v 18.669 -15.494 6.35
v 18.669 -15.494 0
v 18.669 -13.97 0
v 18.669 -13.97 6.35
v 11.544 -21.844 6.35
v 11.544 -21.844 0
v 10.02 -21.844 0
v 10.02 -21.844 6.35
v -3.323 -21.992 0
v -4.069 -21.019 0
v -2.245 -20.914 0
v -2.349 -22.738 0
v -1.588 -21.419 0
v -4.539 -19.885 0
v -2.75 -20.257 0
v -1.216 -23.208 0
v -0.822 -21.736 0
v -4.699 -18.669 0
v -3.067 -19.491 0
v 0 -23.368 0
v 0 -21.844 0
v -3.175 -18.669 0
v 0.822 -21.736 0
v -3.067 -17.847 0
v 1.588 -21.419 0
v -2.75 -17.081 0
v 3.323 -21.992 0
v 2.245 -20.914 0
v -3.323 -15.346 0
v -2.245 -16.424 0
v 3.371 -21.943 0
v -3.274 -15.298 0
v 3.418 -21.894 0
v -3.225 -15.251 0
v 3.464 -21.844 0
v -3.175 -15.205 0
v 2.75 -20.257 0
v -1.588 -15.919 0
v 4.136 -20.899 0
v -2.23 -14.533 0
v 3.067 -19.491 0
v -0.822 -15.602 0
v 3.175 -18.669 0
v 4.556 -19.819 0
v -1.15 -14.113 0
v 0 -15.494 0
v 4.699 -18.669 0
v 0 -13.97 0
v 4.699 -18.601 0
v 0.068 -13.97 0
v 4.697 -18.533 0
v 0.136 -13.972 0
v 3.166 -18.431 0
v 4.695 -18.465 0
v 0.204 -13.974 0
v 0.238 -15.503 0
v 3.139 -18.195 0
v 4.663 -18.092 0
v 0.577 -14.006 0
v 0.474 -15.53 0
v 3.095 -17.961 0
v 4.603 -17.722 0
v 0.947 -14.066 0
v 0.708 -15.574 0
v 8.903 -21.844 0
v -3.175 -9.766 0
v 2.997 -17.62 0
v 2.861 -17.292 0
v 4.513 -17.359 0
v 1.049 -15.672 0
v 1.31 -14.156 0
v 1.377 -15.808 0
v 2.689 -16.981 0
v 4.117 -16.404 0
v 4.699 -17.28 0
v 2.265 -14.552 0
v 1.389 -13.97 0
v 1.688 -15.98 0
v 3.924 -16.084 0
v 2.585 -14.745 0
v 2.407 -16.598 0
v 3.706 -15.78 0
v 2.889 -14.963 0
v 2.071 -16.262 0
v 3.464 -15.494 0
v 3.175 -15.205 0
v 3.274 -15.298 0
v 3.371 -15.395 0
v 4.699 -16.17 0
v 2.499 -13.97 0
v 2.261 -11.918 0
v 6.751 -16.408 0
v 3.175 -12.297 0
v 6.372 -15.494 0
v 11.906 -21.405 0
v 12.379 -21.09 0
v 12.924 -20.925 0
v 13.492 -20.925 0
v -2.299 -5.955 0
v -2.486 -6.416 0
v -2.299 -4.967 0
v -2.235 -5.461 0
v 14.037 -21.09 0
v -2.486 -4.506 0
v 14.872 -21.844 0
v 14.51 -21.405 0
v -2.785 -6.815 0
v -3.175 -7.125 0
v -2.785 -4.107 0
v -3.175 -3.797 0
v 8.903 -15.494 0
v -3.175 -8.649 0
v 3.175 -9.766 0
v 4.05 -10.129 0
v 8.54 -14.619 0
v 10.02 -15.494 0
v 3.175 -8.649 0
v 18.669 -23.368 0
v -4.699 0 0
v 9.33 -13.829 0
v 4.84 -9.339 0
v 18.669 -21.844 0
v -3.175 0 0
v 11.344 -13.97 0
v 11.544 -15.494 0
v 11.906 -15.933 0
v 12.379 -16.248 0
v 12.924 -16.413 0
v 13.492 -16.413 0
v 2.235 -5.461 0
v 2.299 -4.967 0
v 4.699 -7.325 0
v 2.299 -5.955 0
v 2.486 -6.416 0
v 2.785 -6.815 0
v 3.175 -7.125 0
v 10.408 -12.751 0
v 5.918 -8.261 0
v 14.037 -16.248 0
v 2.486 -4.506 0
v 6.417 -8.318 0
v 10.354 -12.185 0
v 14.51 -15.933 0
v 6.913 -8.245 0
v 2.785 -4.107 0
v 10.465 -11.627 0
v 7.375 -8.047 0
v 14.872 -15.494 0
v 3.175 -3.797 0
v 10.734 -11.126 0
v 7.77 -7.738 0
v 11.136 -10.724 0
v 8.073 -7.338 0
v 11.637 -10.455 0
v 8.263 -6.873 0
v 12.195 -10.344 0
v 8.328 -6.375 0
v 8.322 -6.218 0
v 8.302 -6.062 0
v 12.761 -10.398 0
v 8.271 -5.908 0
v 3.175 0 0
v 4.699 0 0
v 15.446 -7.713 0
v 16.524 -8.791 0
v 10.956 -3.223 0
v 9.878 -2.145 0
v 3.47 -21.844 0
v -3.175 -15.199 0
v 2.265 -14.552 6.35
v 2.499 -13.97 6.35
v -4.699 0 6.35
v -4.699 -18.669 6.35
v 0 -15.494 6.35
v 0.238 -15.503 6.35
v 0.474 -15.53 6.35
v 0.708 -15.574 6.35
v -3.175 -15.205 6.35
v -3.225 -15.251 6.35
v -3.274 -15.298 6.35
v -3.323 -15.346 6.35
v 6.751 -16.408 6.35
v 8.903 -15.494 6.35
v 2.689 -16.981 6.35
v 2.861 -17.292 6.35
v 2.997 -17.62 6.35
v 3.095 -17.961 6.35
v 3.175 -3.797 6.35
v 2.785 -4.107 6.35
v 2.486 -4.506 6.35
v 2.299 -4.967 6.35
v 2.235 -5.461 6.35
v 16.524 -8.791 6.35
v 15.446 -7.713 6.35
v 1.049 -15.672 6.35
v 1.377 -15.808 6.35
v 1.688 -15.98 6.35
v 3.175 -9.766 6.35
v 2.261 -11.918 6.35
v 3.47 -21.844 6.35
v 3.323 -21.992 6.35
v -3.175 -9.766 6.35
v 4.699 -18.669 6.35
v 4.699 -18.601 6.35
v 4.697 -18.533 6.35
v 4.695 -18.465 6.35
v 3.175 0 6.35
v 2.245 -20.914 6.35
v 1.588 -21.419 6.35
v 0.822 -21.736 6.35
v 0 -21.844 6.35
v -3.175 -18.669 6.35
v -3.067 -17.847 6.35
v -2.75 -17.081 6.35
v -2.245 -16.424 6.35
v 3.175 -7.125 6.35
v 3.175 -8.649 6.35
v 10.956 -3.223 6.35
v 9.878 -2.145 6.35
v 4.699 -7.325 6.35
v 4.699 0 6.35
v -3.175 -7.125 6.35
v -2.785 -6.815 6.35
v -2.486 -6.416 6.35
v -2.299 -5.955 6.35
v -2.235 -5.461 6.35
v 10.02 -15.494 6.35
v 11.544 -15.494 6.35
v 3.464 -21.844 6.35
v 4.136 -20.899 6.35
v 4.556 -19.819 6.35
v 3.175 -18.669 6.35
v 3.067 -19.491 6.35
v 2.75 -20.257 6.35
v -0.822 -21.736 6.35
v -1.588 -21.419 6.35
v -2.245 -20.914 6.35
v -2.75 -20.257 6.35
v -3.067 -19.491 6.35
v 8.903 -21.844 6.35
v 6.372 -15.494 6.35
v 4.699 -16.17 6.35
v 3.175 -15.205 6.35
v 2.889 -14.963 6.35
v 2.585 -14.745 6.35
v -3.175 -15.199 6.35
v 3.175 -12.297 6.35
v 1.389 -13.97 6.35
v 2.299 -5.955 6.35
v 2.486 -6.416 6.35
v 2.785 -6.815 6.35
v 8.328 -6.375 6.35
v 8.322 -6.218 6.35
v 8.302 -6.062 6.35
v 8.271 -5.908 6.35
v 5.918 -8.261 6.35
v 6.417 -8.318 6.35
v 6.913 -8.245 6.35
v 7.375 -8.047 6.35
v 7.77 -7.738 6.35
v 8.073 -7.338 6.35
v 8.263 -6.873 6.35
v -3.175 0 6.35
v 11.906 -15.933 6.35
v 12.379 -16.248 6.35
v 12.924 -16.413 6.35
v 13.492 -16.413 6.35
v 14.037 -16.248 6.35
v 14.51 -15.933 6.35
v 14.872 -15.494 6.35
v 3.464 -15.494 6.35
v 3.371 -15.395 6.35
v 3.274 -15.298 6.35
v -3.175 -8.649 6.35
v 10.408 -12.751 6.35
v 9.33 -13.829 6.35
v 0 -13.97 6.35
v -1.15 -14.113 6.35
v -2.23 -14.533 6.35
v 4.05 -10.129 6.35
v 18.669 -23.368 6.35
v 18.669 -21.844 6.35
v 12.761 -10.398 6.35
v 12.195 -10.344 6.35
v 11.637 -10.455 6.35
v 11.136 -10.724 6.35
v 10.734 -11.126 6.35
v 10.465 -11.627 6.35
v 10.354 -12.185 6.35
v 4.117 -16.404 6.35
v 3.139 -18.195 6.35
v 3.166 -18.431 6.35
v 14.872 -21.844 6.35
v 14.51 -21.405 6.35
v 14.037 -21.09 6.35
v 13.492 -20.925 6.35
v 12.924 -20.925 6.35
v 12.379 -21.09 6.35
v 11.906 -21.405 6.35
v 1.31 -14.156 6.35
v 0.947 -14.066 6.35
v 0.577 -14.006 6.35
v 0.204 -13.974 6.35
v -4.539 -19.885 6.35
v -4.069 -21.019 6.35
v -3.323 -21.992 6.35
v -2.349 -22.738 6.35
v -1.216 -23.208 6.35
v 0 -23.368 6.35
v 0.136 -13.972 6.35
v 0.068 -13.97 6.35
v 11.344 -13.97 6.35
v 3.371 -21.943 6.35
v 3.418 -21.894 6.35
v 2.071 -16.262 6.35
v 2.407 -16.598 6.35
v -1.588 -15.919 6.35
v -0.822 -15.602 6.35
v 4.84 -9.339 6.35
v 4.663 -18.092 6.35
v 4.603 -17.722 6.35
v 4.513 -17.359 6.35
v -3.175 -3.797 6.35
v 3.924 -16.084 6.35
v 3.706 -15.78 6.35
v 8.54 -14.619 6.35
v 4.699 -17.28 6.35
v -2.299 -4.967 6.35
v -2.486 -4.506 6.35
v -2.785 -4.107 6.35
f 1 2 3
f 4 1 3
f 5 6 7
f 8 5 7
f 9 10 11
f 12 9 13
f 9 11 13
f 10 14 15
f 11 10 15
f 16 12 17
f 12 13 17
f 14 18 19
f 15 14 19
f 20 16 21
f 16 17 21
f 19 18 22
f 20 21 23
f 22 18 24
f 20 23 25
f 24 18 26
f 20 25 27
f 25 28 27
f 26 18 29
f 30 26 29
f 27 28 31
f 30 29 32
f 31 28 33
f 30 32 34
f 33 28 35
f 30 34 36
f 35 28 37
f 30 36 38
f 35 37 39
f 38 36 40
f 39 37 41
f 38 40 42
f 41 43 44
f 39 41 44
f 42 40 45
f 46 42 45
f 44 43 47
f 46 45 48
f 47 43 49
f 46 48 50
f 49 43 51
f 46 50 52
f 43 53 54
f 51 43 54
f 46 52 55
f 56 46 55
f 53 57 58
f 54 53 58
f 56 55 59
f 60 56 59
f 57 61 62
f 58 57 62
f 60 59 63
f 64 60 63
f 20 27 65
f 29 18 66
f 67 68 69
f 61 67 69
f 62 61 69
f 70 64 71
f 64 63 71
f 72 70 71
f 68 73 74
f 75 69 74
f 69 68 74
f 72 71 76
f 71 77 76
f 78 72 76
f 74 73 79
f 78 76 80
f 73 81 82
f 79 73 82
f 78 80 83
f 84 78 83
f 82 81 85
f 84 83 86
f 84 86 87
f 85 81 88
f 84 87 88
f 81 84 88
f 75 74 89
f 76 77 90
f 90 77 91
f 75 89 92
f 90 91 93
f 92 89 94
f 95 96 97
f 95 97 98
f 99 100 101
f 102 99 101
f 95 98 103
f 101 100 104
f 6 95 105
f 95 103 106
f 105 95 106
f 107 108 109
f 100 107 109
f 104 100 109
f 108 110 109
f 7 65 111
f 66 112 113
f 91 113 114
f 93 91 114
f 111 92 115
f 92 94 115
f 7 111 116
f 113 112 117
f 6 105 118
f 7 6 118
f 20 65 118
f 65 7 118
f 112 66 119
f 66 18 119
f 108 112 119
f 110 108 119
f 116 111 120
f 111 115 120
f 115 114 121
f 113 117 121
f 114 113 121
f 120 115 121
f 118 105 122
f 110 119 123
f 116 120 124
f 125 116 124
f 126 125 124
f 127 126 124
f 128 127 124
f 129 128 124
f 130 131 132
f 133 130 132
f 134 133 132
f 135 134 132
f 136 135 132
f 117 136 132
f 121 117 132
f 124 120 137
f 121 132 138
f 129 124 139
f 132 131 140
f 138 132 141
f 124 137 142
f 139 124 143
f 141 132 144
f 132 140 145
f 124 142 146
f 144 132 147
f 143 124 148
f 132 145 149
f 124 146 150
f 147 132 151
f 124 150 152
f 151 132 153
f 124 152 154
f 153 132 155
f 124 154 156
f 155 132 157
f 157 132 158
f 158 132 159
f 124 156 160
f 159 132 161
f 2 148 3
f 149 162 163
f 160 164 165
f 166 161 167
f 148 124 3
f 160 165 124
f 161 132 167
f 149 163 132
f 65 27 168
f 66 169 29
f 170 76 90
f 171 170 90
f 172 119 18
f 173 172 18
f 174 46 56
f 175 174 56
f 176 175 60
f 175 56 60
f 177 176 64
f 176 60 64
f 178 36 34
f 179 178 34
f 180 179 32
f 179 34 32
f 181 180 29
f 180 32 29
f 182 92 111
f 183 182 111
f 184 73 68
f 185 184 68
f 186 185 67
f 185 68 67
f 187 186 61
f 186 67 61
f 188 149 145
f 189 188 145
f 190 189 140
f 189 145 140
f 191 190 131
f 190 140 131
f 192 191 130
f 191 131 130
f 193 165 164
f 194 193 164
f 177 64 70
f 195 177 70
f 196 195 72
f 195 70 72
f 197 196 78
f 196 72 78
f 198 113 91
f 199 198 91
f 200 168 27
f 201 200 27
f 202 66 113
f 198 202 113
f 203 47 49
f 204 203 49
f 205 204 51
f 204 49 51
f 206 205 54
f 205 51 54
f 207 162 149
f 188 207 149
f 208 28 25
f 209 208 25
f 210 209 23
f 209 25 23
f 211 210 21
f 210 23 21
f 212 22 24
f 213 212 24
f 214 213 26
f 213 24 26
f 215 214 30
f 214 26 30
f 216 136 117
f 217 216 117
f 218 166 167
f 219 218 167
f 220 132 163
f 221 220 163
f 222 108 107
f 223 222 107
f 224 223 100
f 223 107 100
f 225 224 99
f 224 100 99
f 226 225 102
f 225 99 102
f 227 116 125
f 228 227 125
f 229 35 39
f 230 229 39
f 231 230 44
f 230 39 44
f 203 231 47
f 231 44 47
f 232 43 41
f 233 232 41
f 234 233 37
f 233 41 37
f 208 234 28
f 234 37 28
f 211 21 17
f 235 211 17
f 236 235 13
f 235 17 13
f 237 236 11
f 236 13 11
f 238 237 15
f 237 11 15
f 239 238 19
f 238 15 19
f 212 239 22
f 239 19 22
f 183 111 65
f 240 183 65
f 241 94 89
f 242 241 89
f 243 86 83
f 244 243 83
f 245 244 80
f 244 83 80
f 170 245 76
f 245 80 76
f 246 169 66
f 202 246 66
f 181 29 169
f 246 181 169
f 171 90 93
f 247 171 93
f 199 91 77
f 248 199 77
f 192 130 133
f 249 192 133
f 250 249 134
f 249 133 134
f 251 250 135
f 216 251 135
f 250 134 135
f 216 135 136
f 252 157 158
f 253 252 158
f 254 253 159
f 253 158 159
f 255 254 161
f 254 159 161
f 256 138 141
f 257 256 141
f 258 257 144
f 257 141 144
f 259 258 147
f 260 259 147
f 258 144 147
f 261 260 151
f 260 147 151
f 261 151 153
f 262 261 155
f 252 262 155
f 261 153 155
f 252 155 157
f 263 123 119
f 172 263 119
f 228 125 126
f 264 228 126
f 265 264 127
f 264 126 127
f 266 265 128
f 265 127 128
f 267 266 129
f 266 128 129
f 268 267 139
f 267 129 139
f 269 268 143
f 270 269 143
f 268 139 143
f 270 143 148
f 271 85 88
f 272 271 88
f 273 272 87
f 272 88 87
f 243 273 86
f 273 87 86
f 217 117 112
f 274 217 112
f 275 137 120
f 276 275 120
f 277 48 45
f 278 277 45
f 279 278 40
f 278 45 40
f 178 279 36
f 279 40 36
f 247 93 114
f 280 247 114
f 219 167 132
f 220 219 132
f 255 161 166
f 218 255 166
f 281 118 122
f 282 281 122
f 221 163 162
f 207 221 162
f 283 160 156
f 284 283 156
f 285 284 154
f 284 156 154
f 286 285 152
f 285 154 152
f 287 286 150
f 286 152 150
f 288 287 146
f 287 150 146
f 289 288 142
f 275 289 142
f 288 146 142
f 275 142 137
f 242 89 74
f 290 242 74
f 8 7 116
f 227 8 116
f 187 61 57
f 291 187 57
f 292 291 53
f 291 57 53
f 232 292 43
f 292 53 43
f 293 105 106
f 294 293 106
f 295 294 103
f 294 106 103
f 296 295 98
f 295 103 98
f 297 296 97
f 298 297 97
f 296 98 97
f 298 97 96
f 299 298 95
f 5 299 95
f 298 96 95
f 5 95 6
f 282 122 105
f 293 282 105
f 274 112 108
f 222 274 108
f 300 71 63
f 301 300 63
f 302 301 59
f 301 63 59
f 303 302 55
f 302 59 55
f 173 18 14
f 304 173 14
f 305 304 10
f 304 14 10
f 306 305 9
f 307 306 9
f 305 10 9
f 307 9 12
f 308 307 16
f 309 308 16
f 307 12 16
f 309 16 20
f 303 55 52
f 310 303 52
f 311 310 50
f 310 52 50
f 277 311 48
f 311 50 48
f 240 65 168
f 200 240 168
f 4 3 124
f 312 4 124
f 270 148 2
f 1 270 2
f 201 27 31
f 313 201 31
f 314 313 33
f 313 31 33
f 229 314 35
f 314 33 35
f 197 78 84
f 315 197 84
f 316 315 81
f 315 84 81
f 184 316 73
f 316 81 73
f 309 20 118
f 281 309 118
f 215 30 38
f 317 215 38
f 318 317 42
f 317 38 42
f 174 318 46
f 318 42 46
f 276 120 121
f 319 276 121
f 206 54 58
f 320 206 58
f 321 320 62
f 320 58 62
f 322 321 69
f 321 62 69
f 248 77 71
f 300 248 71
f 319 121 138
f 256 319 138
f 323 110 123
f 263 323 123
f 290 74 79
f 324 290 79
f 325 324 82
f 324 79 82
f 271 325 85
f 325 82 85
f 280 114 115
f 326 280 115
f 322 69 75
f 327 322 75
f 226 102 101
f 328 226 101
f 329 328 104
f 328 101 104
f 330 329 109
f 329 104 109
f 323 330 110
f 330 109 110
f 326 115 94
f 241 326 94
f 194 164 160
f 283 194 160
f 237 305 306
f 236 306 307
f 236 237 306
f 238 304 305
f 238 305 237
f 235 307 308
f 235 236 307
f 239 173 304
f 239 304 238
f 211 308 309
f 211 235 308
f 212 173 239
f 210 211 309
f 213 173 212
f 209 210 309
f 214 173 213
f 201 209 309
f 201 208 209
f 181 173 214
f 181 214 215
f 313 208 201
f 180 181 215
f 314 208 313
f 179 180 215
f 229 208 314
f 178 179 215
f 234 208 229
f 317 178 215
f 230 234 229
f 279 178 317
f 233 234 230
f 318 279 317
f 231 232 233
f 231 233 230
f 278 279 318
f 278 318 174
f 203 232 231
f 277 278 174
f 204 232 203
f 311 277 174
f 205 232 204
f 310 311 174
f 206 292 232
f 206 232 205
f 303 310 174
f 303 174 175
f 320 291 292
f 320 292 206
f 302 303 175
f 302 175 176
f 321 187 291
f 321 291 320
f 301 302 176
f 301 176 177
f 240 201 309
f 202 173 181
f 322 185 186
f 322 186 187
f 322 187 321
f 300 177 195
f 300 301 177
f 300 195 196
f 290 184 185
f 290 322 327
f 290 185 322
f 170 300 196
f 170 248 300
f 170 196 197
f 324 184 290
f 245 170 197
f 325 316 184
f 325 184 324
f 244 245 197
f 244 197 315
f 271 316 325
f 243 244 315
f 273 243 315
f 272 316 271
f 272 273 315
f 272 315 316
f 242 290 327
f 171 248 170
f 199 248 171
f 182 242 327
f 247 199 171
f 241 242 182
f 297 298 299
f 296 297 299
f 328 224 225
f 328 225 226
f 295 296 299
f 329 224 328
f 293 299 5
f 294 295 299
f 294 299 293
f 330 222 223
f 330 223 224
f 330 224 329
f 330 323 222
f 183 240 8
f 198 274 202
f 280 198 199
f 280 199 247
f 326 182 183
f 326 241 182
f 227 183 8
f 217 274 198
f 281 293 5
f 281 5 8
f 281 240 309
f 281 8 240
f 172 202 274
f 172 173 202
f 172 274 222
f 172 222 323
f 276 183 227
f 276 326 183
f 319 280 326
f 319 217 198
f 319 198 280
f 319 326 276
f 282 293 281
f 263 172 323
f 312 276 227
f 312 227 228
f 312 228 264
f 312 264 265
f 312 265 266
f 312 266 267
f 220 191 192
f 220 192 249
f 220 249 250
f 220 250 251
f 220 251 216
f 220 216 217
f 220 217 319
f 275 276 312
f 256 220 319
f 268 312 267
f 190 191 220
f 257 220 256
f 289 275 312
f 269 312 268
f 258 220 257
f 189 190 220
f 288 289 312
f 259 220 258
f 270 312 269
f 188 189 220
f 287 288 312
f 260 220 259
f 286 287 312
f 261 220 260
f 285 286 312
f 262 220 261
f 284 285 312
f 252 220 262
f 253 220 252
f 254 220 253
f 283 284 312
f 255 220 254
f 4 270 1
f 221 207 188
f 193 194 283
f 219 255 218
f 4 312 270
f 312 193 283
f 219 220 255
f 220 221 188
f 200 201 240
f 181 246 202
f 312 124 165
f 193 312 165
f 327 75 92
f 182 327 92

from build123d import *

# Parameters (mm, degrees)
F0_W     = 1.524
F0_H     = 4.2037
F0_W_2   = 4.2037
F0_H_2   = 1.524
F1_DEPTH = 6.35


with BuildPart() as f1:
    # F0 (on Top) → F1 (new body)
    with BuildSketch(Plane.XY):
        with BuildLine():
            Line((-3.175, -18.669), (-3.175, -15.204901849))
            ThreePointArc((-3.175, -15.204901849), (-3.2496165995, -15.2748001007), (-3.3226947648, -15.3463052352))
            ThreePointArc((-3.3226947648, -15.3463052352), (-4.3413099233, -16.8707705513), (-4.699, -18.669))
            ThreePointArc((-4.699, -18.669), (-3.3226947563, -21.9916947733), (2.39e-08, -23.368))
            ThreePointArc((2.39e-08, -23.368), (1.7982294597, -23.0103099187), (3.3226947648, -21.9916947648))
            ThreePointArc((3.3226947648, -21.9916947648), (3.3941998993, -21.9186165995), (3.464098151, -21.844))
            Line((3.464098151, -21.844), (0, -21.844))
            ThreePointArc((0, -21.844), (-2.2450640303, -20.9140640303), (-3.175, -18.669))
        make_face()
        with BuildLine():
            ThreePointArc((0.204423263, -13.9744486764), (0.1022358318, -13.9711123008), (0, -13.97))
            ThreePointArc((0, -13.97), (-1.7033501972, -14.2895937496), (-3.175, -15.204901849))
            Line((-3.175, -15.204901849), (-3.175, -18.669))
            ThreePointArc((-3.175, -18.669), (-2.9333175157, -17.4539801022), (-2.2450640303, -16.4239359697))
            Line((-2.2450640303, -16.4239359697), (0.204423263, -13.9744486764))
        make_face()
        with BuildLine():
            ThreePointArc((1.3099975978, -14.1562949028), (0.7626497547, -14.0323022148), (0.204423263, -13.9744486764))
            Line((0.204423263, -13.9744486764), (-2.2450640303, -16.4239359697))
            ThreePointArc((-2.2450640303, -16.4239359697), (-1.2150198978, -15.7356824843), (0, -15.494))
            Line((0, -15.494), (0.7417000769, -15.494))
            Line((0.7417000769, -15.494), (1.3099975978, -14.1562949028))
        make_face()
        with BuildLine():
            Line((0.7077600368, -15.5738908371), (0.7417000769, -15.494))
            Line((0.7417000769, -15.494), (0, -15.494))
            ThreePointArc((0, -15.494), (0.3561273703, -15.5140359279), (0.7077600368, -15.5738908371))
        make_face()
        with BuildLine():
            Line((1.8842833415, -15.494), (0.7417000769, -15.494))
            Line((0.7417000769, -15.494), (0.7077600368, -15.5738908371))
            ThreePointArc((0.7077600368, -15.5738908371), (1.2150198978, -15.7356824843), (1.6881107561, -15.9799654009))
            Line((1.6881107561, -15.9799654009), (1.8842833415, -15.494))
        make_face()
        with BuildLine():
            ThreePointArc((2.264656191, -14.5517274396), (1.7982294487, -14.3276900767), (1.3099975978, -14.1562949028))
            Line((1.3099975978, -14.1562949028), (0.7417000769, -15.494))
            Line((0.7417000769, -15.494), (1.8842833415, -15.494))
            Line((1.8842833415, -15.494), (2.264656191, -14.5517274396))
        make_face()
        with BuildLine():
            Line((3.175, -15.494), (3.175, -15.204901849))
            ThreePointArc((3.175, -15.204901849), (2.739365633, -14.8510847405), (2.264656191, -14.5517274396))
            Line((2.264656191, -14.5517274396), (1.8842833415, -15.494))
            Line((1.8842833415, -15.494), (3.175, -15.494))
        make_face()
        with BuildLine():
            Line((3.175, -16.7847166585), (3.175, -15.494))
            Line((3.175, -15.494), (1.8842833415, -15.494))
            Line((1.8842833415, -15.494), (1.6881107561, -15.9799654009))
            ThreePointArc((1.6881107561, -15.9799654009), (2.2450640303, -16.4239359697), (2.6890345991, -16.9808892439))
            Line((2.6890345991, -16.9808892439), (3.175, -16.7847166585))
        make_face()
        with BuildLine():
            ThreePointArc((4.1172725604, -16.404343809), (3.8179152595, -15.929634367), (3.464098151, -15.494))
            Line((3.464098151, -15.494), (3.175, -15.494))
            Line((3.175, -15.494), (3.175, -16.7847166585))
            Line((3.175, -16.7847166585), (4.1172725604, -16.404343809))
        make_face()
        with BuildLine():
            Line((3.175, -17.9272999231), (3.175, -16.7847166585))
            Line((3.175, -16.7847166585), (2.6890345991, -16.9808892439))
            ThreePointArc((2.6890345991, -16.9808892439), (2.9333175157, -17.4539801022), (3.0951091629, -17.9612399632))
            Line((3.0951091629, -17.9612399632), (3.175, -17.9272999231))
        make_face()
        with BuildLine():
            ThreePointArc((4.5127050972, -17.3590024022), (4.3413099233, -16.8707705513), (4.1172725604, -16.404343809))
            Line((4.1172725604, -16.404343809), (3.175, -16.7847166585))
            Line((3.175, -16.7847166585), (3.175, -17.9272999231))
            Line((3.175, -17.9272999231), (4.5127050972, -17.3590024022))
        make_face()
        with BuildLine():
            ThreePointArc((3.464098151, -15.494), (3.3226947648, -15.3463052352), (3.175, -15.204901849))
            Line((3.175, -15.204901849), (3.175, -15.494))
            Line((3.175, -15.494), (3.464098151, -15.494))
        make_face()
        with BuildLine():
            ThreePointArc((3.175, -18.669), (2.9333175157, -19.8840198978), (2.2450640303, -20.9140640303))
            Line((2.2450640303, -20.9140640303), (4.6945513236, -18.464576737))
            ThreePointArc((4.6945513236, -18.464576737), (4.6366977852, -17.9063502453), (4.5127050972, -17.3590024022))
            Line((4.5127050972, -17.3590024022), (3.175, -17.9272999231))
            Line((3.175, -17.9272999231), (3.175, -18.669))
        make_face()
        with BuildLine():
            ThreePointArc((3.0951091629, -17.9612399632), (3.1549640721, -18.3128726297), (3.175, -18.669))
            Line((3.175, -18.669), (3.175, -17.9272999231))
            Line((3.175, -17.9272999231), (3.0951091629, -17.9612399632))
        make_face()
        with BuildLine():
            ThreePointArc((2.2450640303, -20.9140640303), (1.2150198978, -21.6023175157), (0, -21.844))
            Line((0, -21.844), (3.464098151, -21.844))
            ThreePointArc((3.464098151, -21.844), (4.3794062504, -20.3723501972), (4.699, -18.669))
            ThreePointArc((4.699, -18.669), (4.6978876992, -18.5667641682), (4.6945513236, -18.464576737))
            Line((4.6945513236, -18.464576737), (2.2450640303, -20.9140640303))
        make_face()
        with BuildLine():
            Line((-3.3226947648, -15.3463052352), (-4.699, -16.7226104704))
            Line((-4.699, -16.7226104704), (-4.699, -18.669))
            ThreePointArc((-4.699, -18.669), (-4.3413099233, -16.8707705513), (-3.3226947648, -15.3463052352))
        make_face()
        Polygon((-3.175, -15.1986104704), (-3.175, -13.97), (-4.699, -13.97), (-4.699, -16.7226104704), (-3.3226947648, -15.3463052352), align=None)
        with Locations((-3.937, -11.86815)):
            Rectangle(F0_W, F0_H)
        with BuildLine():
            Line((-3.175, -8.6487), (-3.175, -7.1247))
            ThreePointArc((-3.175, -7.1247), (-3.9155835913, -7.3857334796), (-4.699, -7.3322426969))
            Line((-4.699, -7.3322426969), (-4.699, -9.7663))
            Line((-4.699, -9.7663), (-3.175, -9.7663))
            Line((-3.175, -9.7663), (-3.175, -8.6487))
        make_face()
        with BuildLine():
            Line((-3.175, -7.1247), (-3.175, -3.7973))
            ThreePointArc((-3.175, -3.7973), (-3.9155835913, -3.5362665204), (-4.699, -3.5897573031))
            Line((-4.699, -3.5897573031), (-4.699, -7.3322426969))
            ThreePointArc((-4.699, -7.3322426969), (-3.9155835913, -7.3857334796), (-3.175, -7.1247))
        make_face()
        with BuildLine():
            Line((-3.175, -3.7973), (-3.175, 0))
            Line((-3.175, 0), (-4.699, 0))
            Line((-4.699, 0), (-4.699, -3.5897573031))
            ThreePointArc((-4.699, -3.5897573031), (-3.9155835913, -3.5362665204), (-3.175, -3.7973))
        make_face()
        with BuildLine():
            ThreePointArc((-2.2352, -5.461), (-2.4863911938, -4.5056045675), (-3.175, -3.7973))
            Line((-3.175, -3.7973), (-3.175, -7.1247))
            ThreePointArc((-3.175, -7.1247), (-2.4863911938, -6.4163954325), (-2.2352, -5.461))
        make_face()
        with BuildLine():
            Line((4.699, 0), (3.175, 0))
            Line((3.175, 0), (3.175, -3.7973))
            ThreePointArc((3.175, -3.7973), (3.9155835913, -3.5362665204), (4.699, -3.5897573031))
            Line((4.699, -3.5897573031), (4.699, 0))
        make_face()
        with BuildLine():
            ThreePointArc((4.699, -3.5897573031), (3.9155835913, -3.5362665204), (3.175, -3.7973))
            Line((3.175, -3.7973), (3.175, -7.1247))
            ThreePointArc((3.175, -7.1247), (3.9101706223, -7.3849885703), (4.6884647047, -7.3351457657))
            Line((4.6884647047, -7.3351457657), (4.6936032009, -7.3300072695))
            ThreePointArc((4.6936032009, -7.3300072695), (4.4428952043, -6.3699901333), (4.699, -5.4113985962))
            Line((4.699, -5.4113985962), (4.699, -3.5897573031))
        make_face()
        with BuildLine():
            Line((3.175, -7.1247), (3.175, -3.7973))
            ThreePointArc((3.175, -3.7973), (2.4863911937, -4.5056045676), (2.2352, -5.4610000002))
            ThreePointArc((2.2352, -5.4610000002), (2.4863911938, -6.4163954326), (3.175, -7.1247))
        make_face()
        with BuildLine():
            Line((4.699, -7.3246104704), (4.699, -5.4113985962))
            ThreePointArc((4.699, -5.4113985962), (4.4428952043, -6.3699901333), (4.6936032009, -7.3300072695))
            Line((4.6936032009, -7.3300072695), (4.699, -7.3246104704))
        make_face()
        with BuildLine():
            ThreePointArc((4.6884647047, -7.3351457657), (3.9101706223, -7.3849885703), (3.175, -7.1247))
            Line((3.175, -7.1247), (3.175, -8.6487))
            Line((3.175, -8.6487), (3.175, -8.8486104704))
            Line((3.175, -8.8486104704), (4.6884647047, -7.3351457657))
        make_face()
        Polygon((3.6876190817, -9.7663), (3.175, -9.2536809183), (3.175, -9.7663), align=None)
        Polygon((3.6876190817, -9.7663), (3.175, -9.7663), (3.175, -11.0038719395), (4.0500955106, -10.1287764289), align=None)
        Polygon((4.0500955106, -10.1287764289), (3.175, -11.0038719395), (3.175, -12.2965927924), align=None)
        with BuildLine():
            Line((9.8782817332, -2.1453287372), (7.3399400013, -4.6836704691))
            ThreePointArc((7.3399400013, -4.6836704691), (7.9317227516, -5.199805829), (8.2708158875, -5.908056052))
            Line((8.2708158875, -5.908056052), (10.9559124677, -3.2229594718))
            Line((10.9559124677, -3.2229594718), (9.8782817332, -2.1453287372))
        make_face()
        with BuildLine():
            ThreePointArc((8.2708158875, -5.908056052), (7.9317227516, -5.199805829), (7.3399400013, -4.6836704691))
            Line((7.3399400013, -4.6836704691), (6.0518450901, -5.9717653803))
            ThreePointArc((6.0518450901, -5.9717653803), (5.5551119515, -6.8306853943), (4.699, -7.3322426969))
            Line((4.699, -7.3322426969), (4.699, -7.339509628))
            ThreePointArc((4.699, -7.339509628), (5.2140928383, -7.9250908364), (5.9179887838, -8.2608831557))
            Line((5.9179887838, -8.2608831557), (8.2708158875, -5.908056052))
        make_face()
        with BuildLine():
            ThreePointArc((8.3278861682, -6.3754541121), (8.3135658123, -6.1400194271), (8.2708158875, -5.908056052))
            Line((8.2708158875, -5.908056052), (5.9179887838, -8.2608831557))
            ThreePointArc((5.9179887838, -8.2608831557), (7.5823378055, -7.9053599983), (8.3278861682, -6.3754541121))
        make_face()
        with BuildLine():
            Line((16.5236712628, -8.7907182668), (15.4460405282, -7.7130875323))
            Line((15.4460405282, -7.7130875323), (12.760943948, -10.3981841125))
            ThreePointArc((12.760943948, -10.3981841125), (13.469194171, -10.7372772484), (13.9853295309, -11.3290599987))
            Line((13.9853295309, -11.3290599987), (16.5236712628, -8.7907182668))
        make_face()
        with BuildLine():
            ThreePointArc((13.9853295309, -11.3290599987), (13.469194171, -10.7372772484), (12.760943948, -10.3981841125))
            Line((12.760943948, -10.3981841125), (10.4081168443, -12.7510112162))
            ThreePointArc((10.4081168443, -12.7510112162), (10.7439091636, -13.4549071617), (11.329490372, -13.97))
            Line((11.329490372, -13.97), (11.3367573031, -13.97))
            ThreePointArc((11.3367573031, -13.97), (11.8383146057, -13.1138880485), (12.6972346197, -12.6171549099))
            Line((12.6972346197, -12.6171549099), (13.9853295309, -11.3290599987))
        make_face()
        with BuildLine():
            Line((10.4081168443, -12.7510112162), (12.760943948, -10.3981841125))
            ThreePointArc((12.760943948, -10.3981841125), (10.9199914432, -10.9100587114), (10.4081168443, -12.7510112162))
        make_face()
        with BuildLine():
            ThreePointArc((5.9179887838, -8.2608831557), (5.2140928383, -7.9250908364), (4.699, -7.339509628))
            Line((4.699, -7.339509628), (4.699, -9.4798719395))
            Line((4.699, -9.4798719395), (4.8403580493, -9.3385138902))
            Line((4.8403580493, -9.3385138902), (5.9179887838, -8.2608831557))
        make_face()
        with BuildLine():
            Line((6.0518450901, -5.9717653803), (4.699, -7.3246104704))
            Line((4.699, -7.3246104704), (4.699, -7.3322426969))
            ThreePointArc((4.699, -7.3322426969), (5.5551119515, -6.8306853943), (6.0518450901, -5.9717653803))
        make_face()
        with BuildLine():
            Line((11.3443895296, -13.97), (12.6972346197, -12.6171549099))
            ThreePointArc((12.6972346197, -12.6171549099), (11.8383146057, -13.1138880485), (11.3367573031, -13.97))
            Line((11.3367573031, -13.97), (11.3443895296, -13.97))
        make_face()
        with BuildLine():
            Line((14.8717, -15.494), (11.5443, -15.494))
            ThreePointArc((11.5443, -15.494), (13.208, -16.4338), (14.8717, -15.494))
        make_face()
        with BuildLine():
            ThreePointArc((13.2576014038, -13.97), (12.2990098667, -14.2261047957), (11.3389927305, -13.9753967991))
            Line((11.3389927305, -13.9753967991), (11.3338542343, -13.9805352953))
            ThreePointArc((11.3338542343, -13.9805352953), (11.2840114297, -14.7588293777), (11.5443, -15.494))
            Line((11.5443, -15.494), (14.8717, -15.494))
            ThreePointArc((14.8717, -15.494), (15.0795020373, -15.0116695348), (15.1504993243, -14.4913006757))
            ThreePointArc((15.1504993243, -14.4913006757), (15.1326027251, -14.2282265885), (15.0792426969, -13.97))
            Line((15.0792426969, -13.97), (13.2576014038, -13.97))
        make_face()
        with BuildLine():
            Line((18.669, -13.97), (15.0792426969, -13.97))
            ThreePointArc((15.0792426969, -13.97), (15.1326027251, -14.2282265885), (15.1504993243, -14.4913006757))
            ThreePointArc((15.1504993243, -14.4913006757), (15.0795020373, -15.0116695348), (14.8717, -15.494))
            Line((14.8717, -15.494), (18.669, -15.494))
            Line((18.669, -15.494), (18.669, -13.97))
        make_face()
        with BuildLine():
            ThreePointArc((11.5443, -15.494), (11.2840114297, -14.7588293777), (11.3338542343, -13.9805352953))
            Line((11.3338542343, -13.9805352953), (9.8203895296, -15.494))
            Line((9.8203895296, -15.494), (10.0203, -15.494))
            Line((10.0203, -15.494), (11.5443, -15.494))
        make_face()
        with BuildLine():
            ThreePointArc((14.8717, -21.844), (13.208, -20.9042), (11.5443, -21.844))
            Line((11.5443, -21.844), (14.8717, -21.844))
        make_face()
        with BuildLine():
            Line((8.9027, -21.844), (8.9027, -23.368))
            Line((8.9027, -23.368), (11.3367573031, -23.368))
            ThreePointArc((11.3367573031, -23.368), (11.2832665204, -22.5845835913), (11.5443, -21.844))
            Line((11.5443, -21.844), (10.0203, -21.844))
            Line((10.0203, -21.844), (8.9027, -21.844))
        make_face()
        with BuildLine():
            ThreePointArc((11.5443, -21.844), (11.2832665204, -22.5845835913), (11.3367573031, -23.368))
            Line((11.3367573031, -23.368), (15.0792426969, -23.368))
            ThreePointArc((15.0792426969, -23.368), (15.1326027251, -23.1097734115), (15.1504993243, -22.8466993243))
            ThreePointArc((15.1504993243, -22.8466993243), (15.0795020373, -22.3263304652), (14.8717, -21.844))
            Line((14.8717, -21.844), (11.5443, -21.844))
        make_face()
        with BuildLine():
            ThreePointArc((15.1504993243, -22.8466993243), (15.1326027251, -23.1097734115), (15.0792426969, -23.368))
            Line((15.0792426969, -23.368), (18.669, -23.368))
            Line((18.669, -23.368), (18.669, -21.844))
            Line((18.669, -21.844), (14.8717, -21.844))
            ThreePointArc((14.8717, -21.844), (15.0795020373, -22.3263304652), (15.1504993243, -22.8466993243))
        make_face()
        with BuildLine():
            ThreePointArc((3.3226947648, -21.9916947648), (1.7982294597, -23.0103099187), (2.39e-08, -23.368))
            Line((2.39e-08, -23.368), (1.9463895296, -23.368))
            Line((1.9463895296, -23.368), (3.3226947648, -21.9916947648))
        make_face()
        Polygon((3.3226947648, -21.9916947648), (1.9463895296, -23.368), (4.699, -23.368), (4.699, -21.844), (3.4703895296, -21.844), align=None)
        with Locations((6.80085, -22.606)):
            Rectangle(F0_W_2, F0_H_2)
        with BuildLine():
            ThreePointArc((4.6954279578, -7.3332341432), (4.6919472195, -7.3341931901), (4.6884647047, -7.3351457657))
            Line((4.6884647047, -7.3351457657), (3.175, -8.8486104704))
            Line((3.175, -8.8486104704), (3.175, -9.2536809183))
            Line((3.175, -9.2536809183), (3.6876190817, -9.7663))
            Line((3.6876190817, -9.7663), (4.4125719395, -9.7663))
            Line((4.4125719395, -9.7663), (4.699, -9.4798719395))
            Line((4.699, -9.4798719395), (4.699, -7.339509628))
            ThreePointArc((4.699, -7.339509628), (4.6972110629, -7.3363735454), (4.6954279578, -7.3332341432))
        make_face()
        Polygon((4.4125719395, -9.7663), (3.6876190817, -9.7663), (4.0500955106, -10.1287764289), align=None)
        Polygon((3.175, -11.0038719395), (3.175, -9.7663), (2.2609083187, -11.9179636207), align=None)
        Polygon((3.175, -12.2965927924), (3.175, -11.0038719395), (2.2609083187, -11.9179636207), (1.3891412982, -13.97), (2.4994856163, -13.97), align=None)
        with BuildLine():
            Line((2.4994856163, -13.97), (1.3891412982, -13.97))
            Line((1.3891412982, -13.97), (1.3099975978, -14.1562949028))
            ThreePointArc((1.3099975978, -14.1562949028), (1.7982294487, -14.3276900767), (2.264656191, -14.5517274396))
            Line((2.264656191, -14.5517274396), (2.4994856163, -13.97))
        make_face()
        with BuildLine():
            Line((10.4081168443, -12.7510112162), (9.3304861098, -13.8286419507))
            Line((9.3304861098, -13.8286419507), (9.1891280605, -13.97))
            Line((9.1891280605, -13.97), (11.329490372, -13.97))
            ThreePointArc((11.329490372, -13.97), (10.7439091636, -13.4549071617), (10.4081168443, -12.7510112162))
        make_face()
        with BuildLine():
            Line((11.329490372, -13.97), (9.1891280605, -13.97))
            Line((9.1891280605, -13.97), (8.9027, -14.2564280605))
            Line((8.9027, -14.2564280605), (8.9027, -14.9813809183))
            Line((8.9027, -14.9813809183), (9.4153190817, -15.494))
            Line((9.4153190817, -15.494), (9.8203895296, -15.494))
            Line((9.8203895296, -15.494), (11.3338542343, -13.9805352953))
            ThreePointArc((11.3338542343, -13.9805352953), (11.3348068099, -13.9770527805), (11.3357658568, -13.9735720422))
            ThreePointArc((11.3357658568, -13.9735720422), (11.3326264546, -13.9717889371), (11.329490372, -13.97))
        make_face()
        with BuildLine():
            Line((13.2576014038, -13.97), (11.3443895296, -13.97))
            Line((11.3443895296, -13.97), (11.3389927305, -13.9753967991))
            ThreePointArc((11.3389927305, -13.9753967991), (12.2990098667, -14.2261047957), (13.2576014038, -13.97))
        make_face()
        Polygon((9.4153190817, -15.494), (8.9027, -14.9813809183), (8.9027, -15.494), align=None)
        Polygon((8.9027, -14.2564280605), (8.5402235711, -14.6189044894), (8.9027, -14.9813809183), align=None)
        Polygon((8.9027, -14.9813809183), (8.5402235711, -14.6189044894), (7.6651280605, -15.494), (8.9027, -15.494), align=None)
        Polygon((7.6651280605, -15.494), (8.5402235711, -14.6189044894), (6.3724072076, -15.494), align=None)
        Polygon((8.9027, -15.494), (7.6651280605, -15.494), (6.7510363793, -16.4080916813), align=None)
        Polygon((6.3724072076, -15.494), (4.699, -16.1695143837), (4.699, -17.2798587018), (6.7510363793, -16.4080916813), (7.6651280605, -15.494), align=None)
        with BuildLine():
            Line((4.699, -17.2798587018), (4.699, -16.1695143837))
            Line((4.699, -16.1695143837), (4.1172725604, -16.404343809))
            ThreePointArc((4.1172725604, -16.404343809), (4.3413099233, -16.8707705513), (4.5127050972, -17.3590024022))
            Line((4.5127050972, -17.3590024022), (4.699, -17.2798587018))
        make_face()
        Polygon((2.9724647761, -9.0511456943), (2.2573104704, -9.7663), (3.175, -9.7663), (3.175, -9.2536809183), align=None)
        Polygon((3.175, -9.2536809183), (3.175, -8.8486104704), (2.9724647761, -9.0511456943), align=None)
        Polygon((2.2352, -8.6487), (0, -8.6487), (-2.2352, -8.6487), (-3.175, -8.6487), (-3.175, -9.7663), (2.2573104704, -9.7663), (2.9724647761, -9.0511456943), (3.175, -8.8486104704), (3.175, -8.6487), align=None)
        Polygon((4.699, -9.7663), (4.699, -9.4798719395), (4.4125719395, -9.7663), align=None)
        Polygon((4.699, -9.7663), (4.4125719395, -9.7663), (4.0500955106, -10.1287764289), (4.699, -10.7776809183), align=None)
        Polygon((4.8403580493, -9.3385138902), (4.699, -9.4798719395), (4.699, -9.7663), (4.699, -10.7776809183), (7.8913190817, -13.97), (8.9027, -13.97), (9.1891280605, -13.97), (9.3304861098, -13.8286419507), align=None)
        Polygon((8.9027, -13.97), (7.8913190817, -13.97), (8.5402235711, -14.6189044894), (8.9027, -14.2564280605), align=None)
        Polygon((8.9027, -14.2564280605), (9.1891280605, -13.97), (8.9027, -13.97), align=None)
        Polygon((8.9027, -16.4116895296), (8.9027, -21.844), (10.0203, -21.844), (10.0203, -15.494), (9.8203895296, -15.494), (9.6178543057, -15.6965352239), align=None)
        Polygon((9.6178543057, -15.6965352239), (9.4153190817, -15.494), (8.9027, -15.494), (8.9027, -16.4116895296), align=None)
        Polygon((9.8203895296, -15.494), (9.4153190817, -15.494), (9.6178543057, -15.6965352239), align=None)
        with BuildLine():
            ThreePointArc((4.699, -7.3322426969), (4.6972142154, -7.3327392722), (4.6954279578, -7.3332341432))
            ThreePointArc((4.6954279578, -7.3332341432), (4.6972110629, -7.3363735454), (4.699, -7.339509628))
            Line((4.699, -7.339509628), (4.699, -7.3322426969))
        make_face()
        with BuildLine():
            Line((4.6936032009, -7.3300072695), (4.6884647047, -7.3351457657))
            ThreePointArc((4.6884647047, -7.3351457657), (4.6919472195, -7.3341931901), (4.6954279578, -7.3332341432))
            ThreePointArc((4.6954279578, -7.3332341432), (4.6945148096, -7.3316211417), (4.6936032009, -7.3300072695))
        make_face()
        with BuildLine():
            ThreePointArc((4.6936032009, -7.3300072695), (4.6945148096, -7.3316211417), (4.6954279578, -7.3332341432))
            ThreePointArc((4.6954279578, -7.3332341432), (4.6972142154, -7.3327392722), (4.699, -7.3322426969))
            Line((4.699, -7.3322426969), (4.699, -7.3246104704))
            Line((4.699, -7.3246104704), (4.6936032009, -7.3300072695))
        make_face()
        with BuildLine():
            ThreePointArc((11.3389927305, -13.9753967991), (11.3373788583, -13.9744851904), (11.3357658568, -13.9735720422))
            ThreePointArc((11.3357658568, -13.9735720422), (11.3348068099, -13.9770527805), (11.3338542343, -13.9805352953))
            Line((11.3338542343, -13.9805352953), (11.3389927305, -13.9753967991))
        make_face()
        with BuildLine():
            Line((11.3367573031, -13.97), (11.329490372, -13.97))
            ThreePointArc((11.329490372, -13.97), (11.3326264546, -13.9717889371), (11.3357658568, -13.9735720422))
            ThreePointArc((11.3357658568, -13.9735720422), (11.3362607278, -13.9717857846), (11.3367573031, -13.97))
        make_face()
        with BuildLine():
            Line((11.3443895296, -13.97), (11.3367573031, -13.97))
            ThreePointArc((11.3367573031, -13.97), (11.3362607278, -13.9717857846), (11.3357658568, -13.9735720422))
            ThreePointArc((11.3357658568, -13.9735720422), (11.3373788583, -13.9744851904), (11.3389927305, -13.9753967991))
            Line((11.3389927305, -13.9753967991), (11.3443895296, -13.97))
        make_face()
    extrude(amount=F1_DEPTH)


solid = f1.part
